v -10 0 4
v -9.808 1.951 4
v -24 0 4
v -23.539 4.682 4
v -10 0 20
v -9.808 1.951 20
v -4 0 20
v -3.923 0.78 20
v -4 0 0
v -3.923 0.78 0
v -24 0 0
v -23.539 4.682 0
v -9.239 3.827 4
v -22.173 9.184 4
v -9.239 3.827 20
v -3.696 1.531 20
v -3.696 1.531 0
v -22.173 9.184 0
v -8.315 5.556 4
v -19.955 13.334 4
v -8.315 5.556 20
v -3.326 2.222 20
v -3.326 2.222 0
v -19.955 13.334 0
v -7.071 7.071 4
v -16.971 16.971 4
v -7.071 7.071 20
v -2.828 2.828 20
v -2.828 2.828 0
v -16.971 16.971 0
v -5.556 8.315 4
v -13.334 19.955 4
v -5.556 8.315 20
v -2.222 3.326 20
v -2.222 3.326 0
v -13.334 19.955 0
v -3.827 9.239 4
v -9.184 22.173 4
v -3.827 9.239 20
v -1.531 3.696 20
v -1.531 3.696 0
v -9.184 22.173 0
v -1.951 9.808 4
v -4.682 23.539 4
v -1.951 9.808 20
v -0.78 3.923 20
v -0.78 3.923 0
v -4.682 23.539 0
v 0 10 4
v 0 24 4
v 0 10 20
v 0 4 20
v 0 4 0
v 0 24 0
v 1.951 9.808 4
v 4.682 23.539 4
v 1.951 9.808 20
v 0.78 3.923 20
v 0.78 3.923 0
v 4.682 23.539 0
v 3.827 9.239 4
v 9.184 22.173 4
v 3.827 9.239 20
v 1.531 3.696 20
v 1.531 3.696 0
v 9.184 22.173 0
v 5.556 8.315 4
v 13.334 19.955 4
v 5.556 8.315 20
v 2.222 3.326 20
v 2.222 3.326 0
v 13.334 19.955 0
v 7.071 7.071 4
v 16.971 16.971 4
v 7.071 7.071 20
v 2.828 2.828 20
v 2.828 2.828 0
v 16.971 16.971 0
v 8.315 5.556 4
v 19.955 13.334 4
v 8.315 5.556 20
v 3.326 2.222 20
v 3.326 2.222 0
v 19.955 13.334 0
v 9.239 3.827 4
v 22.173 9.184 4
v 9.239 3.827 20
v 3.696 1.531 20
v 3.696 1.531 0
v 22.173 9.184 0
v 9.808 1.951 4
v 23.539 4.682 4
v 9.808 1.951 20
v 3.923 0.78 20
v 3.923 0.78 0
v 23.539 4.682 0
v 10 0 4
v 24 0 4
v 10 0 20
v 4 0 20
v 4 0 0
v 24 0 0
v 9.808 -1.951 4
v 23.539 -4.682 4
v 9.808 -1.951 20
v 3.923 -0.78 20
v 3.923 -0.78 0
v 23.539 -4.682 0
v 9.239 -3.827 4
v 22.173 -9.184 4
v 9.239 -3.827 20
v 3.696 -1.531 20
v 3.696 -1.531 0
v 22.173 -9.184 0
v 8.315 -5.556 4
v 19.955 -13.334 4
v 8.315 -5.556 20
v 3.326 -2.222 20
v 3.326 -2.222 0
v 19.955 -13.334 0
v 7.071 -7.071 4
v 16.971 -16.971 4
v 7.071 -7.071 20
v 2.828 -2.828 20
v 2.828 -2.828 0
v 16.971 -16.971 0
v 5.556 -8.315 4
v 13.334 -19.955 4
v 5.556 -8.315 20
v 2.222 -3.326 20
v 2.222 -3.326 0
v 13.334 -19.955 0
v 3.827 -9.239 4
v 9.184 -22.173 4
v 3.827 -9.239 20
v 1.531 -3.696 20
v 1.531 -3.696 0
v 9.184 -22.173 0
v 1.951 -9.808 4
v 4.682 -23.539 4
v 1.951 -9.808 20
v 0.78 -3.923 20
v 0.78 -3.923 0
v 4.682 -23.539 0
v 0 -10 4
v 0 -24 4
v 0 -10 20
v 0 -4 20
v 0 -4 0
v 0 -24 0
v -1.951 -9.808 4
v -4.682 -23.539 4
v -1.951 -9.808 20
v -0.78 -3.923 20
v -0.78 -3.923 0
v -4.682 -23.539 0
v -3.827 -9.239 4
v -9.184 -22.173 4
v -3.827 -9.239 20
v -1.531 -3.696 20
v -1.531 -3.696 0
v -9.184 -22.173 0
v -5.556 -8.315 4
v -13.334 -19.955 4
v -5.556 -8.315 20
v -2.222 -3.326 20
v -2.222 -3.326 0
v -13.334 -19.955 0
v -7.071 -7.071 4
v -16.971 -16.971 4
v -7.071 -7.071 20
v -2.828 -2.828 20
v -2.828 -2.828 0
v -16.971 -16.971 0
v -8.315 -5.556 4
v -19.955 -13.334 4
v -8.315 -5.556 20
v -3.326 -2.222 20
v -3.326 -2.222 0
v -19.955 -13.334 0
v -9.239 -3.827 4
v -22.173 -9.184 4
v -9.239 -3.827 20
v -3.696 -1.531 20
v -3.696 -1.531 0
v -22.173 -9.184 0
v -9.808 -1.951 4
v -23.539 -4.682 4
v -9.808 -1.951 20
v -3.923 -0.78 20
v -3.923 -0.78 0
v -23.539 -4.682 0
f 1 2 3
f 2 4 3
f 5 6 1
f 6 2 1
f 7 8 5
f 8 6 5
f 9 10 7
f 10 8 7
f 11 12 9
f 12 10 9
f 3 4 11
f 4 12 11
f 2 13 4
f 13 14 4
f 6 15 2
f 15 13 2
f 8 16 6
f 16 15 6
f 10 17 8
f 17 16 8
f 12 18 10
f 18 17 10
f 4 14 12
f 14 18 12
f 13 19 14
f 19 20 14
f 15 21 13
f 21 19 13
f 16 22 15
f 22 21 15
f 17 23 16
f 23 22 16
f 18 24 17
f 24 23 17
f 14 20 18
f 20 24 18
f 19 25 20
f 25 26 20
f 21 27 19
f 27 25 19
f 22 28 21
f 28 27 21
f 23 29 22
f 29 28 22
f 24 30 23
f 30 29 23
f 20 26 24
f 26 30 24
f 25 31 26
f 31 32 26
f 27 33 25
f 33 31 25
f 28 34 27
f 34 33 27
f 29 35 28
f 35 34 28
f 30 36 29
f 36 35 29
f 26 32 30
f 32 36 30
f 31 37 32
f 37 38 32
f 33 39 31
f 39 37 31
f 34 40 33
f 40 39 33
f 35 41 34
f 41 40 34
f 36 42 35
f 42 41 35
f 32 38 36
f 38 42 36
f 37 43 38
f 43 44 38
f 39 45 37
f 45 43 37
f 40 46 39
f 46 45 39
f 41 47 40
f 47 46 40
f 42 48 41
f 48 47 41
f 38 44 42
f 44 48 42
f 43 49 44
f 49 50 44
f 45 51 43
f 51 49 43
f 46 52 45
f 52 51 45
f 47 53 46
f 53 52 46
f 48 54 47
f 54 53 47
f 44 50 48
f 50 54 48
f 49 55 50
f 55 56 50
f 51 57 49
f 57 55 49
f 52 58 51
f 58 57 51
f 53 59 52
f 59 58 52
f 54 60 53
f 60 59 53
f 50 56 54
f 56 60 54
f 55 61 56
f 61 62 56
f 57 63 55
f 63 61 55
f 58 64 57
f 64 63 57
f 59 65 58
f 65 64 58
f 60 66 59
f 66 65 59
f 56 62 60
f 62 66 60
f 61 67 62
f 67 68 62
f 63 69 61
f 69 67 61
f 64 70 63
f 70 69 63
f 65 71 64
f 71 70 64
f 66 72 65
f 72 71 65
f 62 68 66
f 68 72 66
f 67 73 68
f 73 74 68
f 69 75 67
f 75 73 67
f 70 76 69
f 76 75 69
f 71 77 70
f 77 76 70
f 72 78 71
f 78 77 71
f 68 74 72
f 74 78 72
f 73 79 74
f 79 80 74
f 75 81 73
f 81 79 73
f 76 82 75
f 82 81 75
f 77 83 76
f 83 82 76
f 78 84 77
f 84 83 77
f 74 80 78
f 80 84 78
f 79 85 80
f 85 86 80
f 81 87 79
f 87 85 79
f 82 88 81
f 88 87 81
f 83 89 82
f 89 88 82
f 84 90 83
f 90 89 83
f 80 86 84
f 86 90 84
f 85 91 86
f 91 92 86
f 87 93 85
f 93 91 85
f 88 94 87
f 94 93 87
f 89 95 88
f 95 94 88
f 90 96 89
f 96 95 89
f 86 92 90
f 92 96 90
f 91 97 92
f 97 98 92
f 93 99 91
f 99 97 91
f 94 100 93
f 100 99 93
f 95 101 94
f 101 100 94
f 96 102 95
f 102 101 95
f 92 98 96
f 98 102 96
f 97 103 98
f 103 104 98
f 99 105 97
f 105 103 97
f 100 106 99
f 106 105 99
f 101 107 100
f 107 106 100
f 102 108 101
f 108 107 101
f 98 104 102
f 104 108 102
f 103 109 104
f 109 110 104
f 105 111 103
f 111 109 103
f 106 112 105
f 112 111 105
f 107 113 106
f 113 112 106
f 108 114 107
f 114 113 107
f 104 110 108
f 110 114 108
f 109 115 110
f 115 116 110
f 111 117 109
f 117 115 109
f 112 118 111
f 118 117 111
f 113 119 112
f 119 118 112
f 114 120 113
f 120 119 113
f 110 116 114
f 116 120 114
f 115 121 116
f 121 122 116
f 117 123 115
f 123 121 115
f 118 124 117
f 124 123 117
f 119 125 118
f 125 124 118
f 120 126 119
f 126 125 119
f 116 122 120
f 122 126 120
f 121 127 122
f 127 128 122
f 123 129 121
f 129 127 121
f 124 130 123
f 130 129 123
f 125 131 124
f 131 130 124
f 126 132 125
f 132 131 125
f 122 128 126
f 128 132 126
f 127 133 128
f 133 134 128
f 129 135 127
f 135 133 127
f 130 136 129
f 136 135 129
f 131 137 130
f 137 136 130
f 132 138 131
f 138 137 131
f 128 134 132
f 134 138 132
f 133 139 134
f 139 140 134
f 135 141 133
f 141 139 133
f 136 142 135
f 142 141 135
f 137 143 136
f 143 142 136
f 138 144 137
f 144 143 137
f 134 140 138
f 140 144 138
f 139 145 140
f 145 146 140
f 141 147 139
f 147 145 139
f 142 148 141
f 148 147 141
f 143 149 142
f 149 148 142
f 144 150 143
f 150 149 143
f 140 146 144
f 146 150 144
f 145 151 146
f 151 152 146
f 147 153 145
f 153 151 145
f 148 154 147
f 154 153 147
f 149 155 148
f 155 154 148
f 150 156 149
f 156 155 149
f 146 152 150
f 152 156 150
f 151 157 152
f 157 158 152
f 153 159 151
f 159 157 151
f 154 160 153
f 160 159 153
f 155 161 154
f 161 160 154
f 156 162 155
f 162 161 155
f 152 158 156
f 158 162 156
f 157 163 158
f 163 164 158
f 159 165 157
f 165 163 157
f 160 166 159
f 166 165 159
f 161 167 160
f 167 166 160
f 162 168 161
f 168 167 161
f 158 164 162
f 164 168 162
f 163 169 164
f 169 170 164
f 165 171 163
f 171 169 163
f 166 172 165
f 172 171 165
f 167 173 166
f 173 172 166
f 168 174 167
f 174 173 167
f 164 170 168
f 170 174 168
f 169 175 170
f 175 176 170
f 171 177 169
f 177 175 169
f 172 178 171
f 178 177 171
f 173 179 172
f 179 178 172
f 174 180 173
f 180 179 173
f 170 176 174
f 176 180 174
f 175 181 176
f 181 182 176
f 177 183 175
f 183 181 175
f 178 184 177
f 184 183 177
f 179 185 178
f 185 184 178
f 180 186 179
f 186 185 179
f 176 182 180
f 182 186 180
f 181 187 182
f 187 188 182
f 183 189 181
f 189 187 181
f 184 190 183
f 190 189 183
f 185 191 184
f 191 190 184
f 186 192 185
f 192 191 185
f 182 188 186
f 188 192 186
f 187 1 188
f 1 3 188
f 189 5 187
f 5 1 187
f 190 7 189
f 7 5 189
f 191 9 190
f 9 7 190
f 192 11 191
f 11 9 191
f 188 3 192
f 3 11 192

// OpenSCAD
$fn = 32;

// ----------------------------------------------------------------------
// Revolved part: flanged bushing R24
// ----------------------------------------------------------------------

// --- parameters (mm) ---
bore_r = 4;               // bore radius
flange_r = 24;            // flange radius
flange_h = 4;             // flange thickness
sleeve_r = 10;            // sleeve radius
total_h = 20;             // overall height
revolve_angle = 360;      // revolve sweep, degrees

bore_d = 2 * bore_r;
flange_d = 2 * flange_r;
sleeve_d = 2 * sleeve_r;

profile = [[4, 0], [24, 0], [24, 4], [10, 4], [10, 20], [4, 20]];  // primary outline, 6 points, counter clockwise

// --- the one profile operation ---
rotate_extrude(angle = revolve_angle) polygon(points = profile);
